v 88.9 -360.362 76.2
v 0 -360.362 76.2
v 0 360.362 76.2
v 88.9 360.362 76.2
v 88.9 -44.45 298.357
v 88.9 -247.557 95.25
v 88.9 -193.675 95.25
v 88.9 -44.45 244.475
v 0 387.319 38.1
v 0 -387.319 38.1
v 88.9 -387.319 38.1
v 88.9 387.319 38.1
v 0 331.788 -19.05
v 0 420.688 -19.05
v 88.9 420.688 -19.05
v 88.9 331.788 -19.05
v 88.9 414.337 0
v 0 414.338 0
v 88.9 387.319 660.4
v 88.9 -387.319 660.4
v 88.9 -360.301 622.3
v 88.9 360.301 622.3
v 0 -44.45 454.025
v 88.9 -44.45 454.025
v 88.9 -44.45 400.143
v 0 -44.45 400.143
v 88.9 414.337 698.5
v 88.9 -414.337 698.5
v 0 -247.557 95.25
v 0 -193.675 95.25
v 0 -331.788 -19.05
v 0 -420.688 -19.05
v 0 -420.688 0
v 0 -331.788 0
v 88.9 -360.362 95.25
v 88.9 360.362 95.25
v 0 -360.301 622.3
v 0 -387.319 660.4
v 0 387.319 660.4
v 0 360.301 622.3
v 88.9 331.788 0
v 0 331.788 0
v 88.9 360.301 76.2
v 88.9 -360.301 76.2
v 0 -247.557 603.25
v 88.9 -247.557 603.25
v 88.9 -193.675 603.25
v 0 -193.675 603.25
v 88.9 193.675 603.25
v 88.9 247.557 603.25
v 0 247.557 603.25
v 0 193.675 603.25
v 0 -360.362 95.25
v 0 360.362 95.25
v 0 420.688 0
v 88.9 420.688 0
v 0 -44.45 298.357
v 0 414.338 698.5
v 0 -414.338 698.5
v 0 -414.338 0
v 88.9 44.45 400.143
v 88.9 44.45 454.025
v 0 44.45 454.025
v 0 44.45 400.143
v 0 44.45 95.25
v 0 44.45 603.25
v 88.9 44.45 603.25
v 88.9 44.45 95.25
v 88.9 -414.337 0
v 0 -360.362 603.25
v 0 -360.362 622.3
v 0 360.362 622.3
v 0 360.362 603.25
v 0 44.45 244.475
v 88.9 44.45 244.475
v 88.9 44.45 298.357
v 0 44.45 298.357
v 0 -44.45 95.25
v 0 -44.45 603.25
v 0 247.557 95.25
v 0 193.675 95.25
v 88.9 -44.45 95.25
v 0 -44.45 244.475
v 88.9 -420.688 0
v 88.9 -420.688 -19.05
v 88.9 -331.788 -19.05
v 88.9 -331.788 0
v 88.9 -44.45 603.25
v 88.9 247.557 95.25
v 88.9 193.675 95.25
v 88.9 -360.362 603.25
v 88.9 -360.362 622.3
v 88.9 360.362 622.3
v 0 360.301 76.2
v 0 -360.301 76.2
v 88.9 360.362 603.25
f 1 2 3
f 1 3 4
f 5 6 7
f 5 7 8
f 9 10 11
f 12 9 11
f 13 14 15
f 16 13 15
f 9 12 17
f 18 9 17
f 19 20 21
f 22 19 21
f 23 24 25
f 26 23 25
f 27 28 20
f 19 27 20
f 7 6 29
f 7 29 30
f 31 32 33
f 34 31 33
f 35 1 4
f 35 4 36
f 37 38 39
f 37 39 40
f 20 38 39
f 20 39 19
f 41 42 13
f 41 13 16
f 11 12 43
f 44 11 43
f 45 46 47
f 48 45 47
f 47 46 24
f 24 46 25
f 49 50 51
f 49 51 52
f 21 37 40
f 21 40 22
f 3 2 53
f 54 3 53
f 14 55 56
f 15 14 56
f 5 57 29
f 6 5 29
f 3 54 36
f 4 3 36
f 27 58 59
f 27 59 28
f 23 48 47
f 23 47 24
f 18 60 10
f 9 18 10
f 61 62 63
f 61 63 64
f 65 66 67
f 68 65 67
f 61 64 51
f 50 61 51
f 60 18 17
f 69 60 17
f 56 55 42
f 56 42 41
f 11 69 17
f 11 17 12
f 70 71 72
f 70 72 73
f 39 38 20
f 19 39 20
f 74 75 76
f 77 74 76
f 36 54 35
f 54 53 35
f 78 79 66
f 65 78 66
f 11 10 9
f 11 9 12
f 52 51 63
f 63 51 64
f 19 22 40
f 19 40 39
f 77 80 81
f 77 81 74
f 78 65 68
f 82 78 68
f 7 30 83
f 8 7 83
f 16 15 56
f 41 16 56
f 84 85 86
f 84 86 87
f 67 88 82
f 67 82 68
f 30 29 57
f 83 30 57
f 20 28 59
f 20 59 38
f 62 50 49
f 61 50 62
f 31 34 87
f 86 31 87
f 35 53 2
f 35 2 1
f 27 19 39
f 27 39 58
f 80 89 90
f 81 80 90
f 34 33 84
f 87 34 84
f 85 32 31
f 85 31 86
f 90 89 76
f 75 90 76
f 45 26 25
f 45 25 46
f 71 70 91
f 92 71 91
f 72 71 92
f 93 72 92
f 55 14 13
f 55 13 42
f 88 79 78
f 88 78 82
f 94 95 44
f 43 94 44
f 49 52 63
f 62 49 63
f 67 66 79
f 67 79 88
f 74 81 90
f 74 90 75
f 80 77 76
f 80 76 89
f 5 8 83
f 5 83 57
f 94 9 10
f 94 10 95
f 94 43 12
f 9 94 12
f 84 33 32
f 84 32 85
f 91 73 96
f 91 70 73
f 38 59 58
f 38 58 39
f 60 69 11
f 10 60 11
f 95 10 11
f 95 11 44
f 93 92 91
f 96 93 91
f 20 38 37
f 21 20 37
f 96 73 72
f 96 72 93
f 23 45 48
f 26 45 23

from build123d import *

# Parameters (mm, degrees)
F0_W      = 88.9
F0_H      = 38.1
F1_DEPTH  = 414.3375
F2_W      = 88.9
F2_H      = 38.1
F3_DEPTH  = 414.3375
F5_W      = 88.9
F5_H      = 19.05
F6_DEPTH  = 88.9
F8_W      = 88.9
F8_H      = 19.05
F9_DEPTH  = 360.3625
F11_DEPTH = 88.901
F12_W     = 88.9
F12_H     = 88.9
F13_DEPTH = 508
F17_DEPTH = 88.9


# Not quite as in the source:
# - a feature names something its author has since deleted; it is built from what else it names


with BuildPart() as f1:
    # F0 (on Front) → F1 (new body, symmetric)
    with BuildSketch(Plane.XZ):
        with Locations((44.45, 19.05)):
            Rectangle(F0_W, F0_H)
    extrude(amount=F1_DEPTH, both=True)


with BuildPart() as f3:
    # F2 (on Front) → F3 (new body, symmetric)
    with BuildSketch(Plane.XZ):
        with Locations((44.45, 57.15)):
            Rectangle(F2_W, F2_H)
    extrude(amount=F3_DEPTH, both=True)


with BuildPart() as f6:
    # F5 (on offset) → F6 (new body)
    with BuildSketch(Plane.XZ.offset(420.6875)):
        with Locations((44.45, -9.525)):
            Rectangle(F5_W, F5_H)
    extrude(amount=-F6_DEPTH)


with BuildPart() as f7_1:
    # F7: instance of F6
    add(f6.part.mirror(Plane.XZ))


with BuildPart() as f9:
    # F8 (on Front) → F9 (new body, symmetric)
    with BuildSketch(Plane.XZ):
        with Locations((44.45, 85.725)):
            Rectangle(F8_W, F8_H)
    extrude(amount=F9_DEPTH, both=True)


with BuildPart() as f11_tool:
    # F10 (on face) → F11 (new body, through all)
    with BuildSketch(Plane.YZ.offset(88.9)):
        Polygon((-360.300630331, 76.2), (-414.3375, 76.2), (-414.3375, 38.1), (-387.3190651655, 38.1), align=None)
        Polygon((-387.3190651655, 38.1), (-414.3375, 38.1), (-414.3375, 0), align=None)
        Polygon((414.3375, 76.2), (360.300630331, 76.2), (387.3190651655, 38.1), (414.3375, 38.1), align=None)
        Polygon((414.3375, 38.1), (387.3190651655, 38.1), (414.3375, 0), align=None)
    extrude(amount=-F11_DEPTH)


with BuildPart() as f1_1:
    add(f1.part)

    # F11: cut by f11_tool
    add(f11_tool.part, mode=Mode.SUBTRACT)


with BuildPart() as f3_1:
    add(f3.part)

    # F11: cut by f11_tool
    add(f11_tool.part, mode=Mode.SUBTRACT)


with BuildPart() as f13:
    # F12 (on face) → F13 (new body)
    with BuildSketch(Plane.XY.offset(95.25)):
        with Locations((44.45, 0)):
            Rectangle(F12_W, F12_H)
    extrude(amount=F13_DEPTH)


with BuildPart() as f15_1:
    # F15: instance of F9
    add(f9.part.mirror(Plane.XY.offset(349.25)))


with BuildPart() as f15_2:
    # F15: instance of F3
    add(f3_1.part.mirror(Plane.XY.offset(349.25)))


with BuildPart() as f15_3:
    # F15: instance of F1
    add(f1_1.part.mirror(Plane.XY.offset(349.25)))


with BuildPart() as f17:
    # F16 (on face) → F17 (new body)
    with BuildSketch(Plane(origin=(0, 0, 0), x_dir=(0, -1, 0), z_dir=(-1, 0, 0))):
        Polygon((-247.5565367264, 95.25), (-193.675, 95.25), (-44.45, 244.475), (-44.45, 298.3565367264), align=None)
    extrude(amount=-F17_DEPTH)


with BuildPart() as f18_1:
    # F18: instance of F17
    add(f17.part.mirror(Plane.XZ))


with BuildPart() as f19_1:
    # F19: instance of F17
    add(f17.part.mirror(Plane.XY.offset(349.25)))


with BuildPart() as f19_2:
    # F19: instance of F18_1
    add(f18_1.part.mirror(Plane.XY.offset(349.25)))


solid = Compound([f6.part, f7_1.part, f9.part, f1_1.part, f3_1.part, f13.part, f15_1.part, f15_2.part, f15_3.part, f17.part, f18_1.part, f19_1.part, f19_2.part])
